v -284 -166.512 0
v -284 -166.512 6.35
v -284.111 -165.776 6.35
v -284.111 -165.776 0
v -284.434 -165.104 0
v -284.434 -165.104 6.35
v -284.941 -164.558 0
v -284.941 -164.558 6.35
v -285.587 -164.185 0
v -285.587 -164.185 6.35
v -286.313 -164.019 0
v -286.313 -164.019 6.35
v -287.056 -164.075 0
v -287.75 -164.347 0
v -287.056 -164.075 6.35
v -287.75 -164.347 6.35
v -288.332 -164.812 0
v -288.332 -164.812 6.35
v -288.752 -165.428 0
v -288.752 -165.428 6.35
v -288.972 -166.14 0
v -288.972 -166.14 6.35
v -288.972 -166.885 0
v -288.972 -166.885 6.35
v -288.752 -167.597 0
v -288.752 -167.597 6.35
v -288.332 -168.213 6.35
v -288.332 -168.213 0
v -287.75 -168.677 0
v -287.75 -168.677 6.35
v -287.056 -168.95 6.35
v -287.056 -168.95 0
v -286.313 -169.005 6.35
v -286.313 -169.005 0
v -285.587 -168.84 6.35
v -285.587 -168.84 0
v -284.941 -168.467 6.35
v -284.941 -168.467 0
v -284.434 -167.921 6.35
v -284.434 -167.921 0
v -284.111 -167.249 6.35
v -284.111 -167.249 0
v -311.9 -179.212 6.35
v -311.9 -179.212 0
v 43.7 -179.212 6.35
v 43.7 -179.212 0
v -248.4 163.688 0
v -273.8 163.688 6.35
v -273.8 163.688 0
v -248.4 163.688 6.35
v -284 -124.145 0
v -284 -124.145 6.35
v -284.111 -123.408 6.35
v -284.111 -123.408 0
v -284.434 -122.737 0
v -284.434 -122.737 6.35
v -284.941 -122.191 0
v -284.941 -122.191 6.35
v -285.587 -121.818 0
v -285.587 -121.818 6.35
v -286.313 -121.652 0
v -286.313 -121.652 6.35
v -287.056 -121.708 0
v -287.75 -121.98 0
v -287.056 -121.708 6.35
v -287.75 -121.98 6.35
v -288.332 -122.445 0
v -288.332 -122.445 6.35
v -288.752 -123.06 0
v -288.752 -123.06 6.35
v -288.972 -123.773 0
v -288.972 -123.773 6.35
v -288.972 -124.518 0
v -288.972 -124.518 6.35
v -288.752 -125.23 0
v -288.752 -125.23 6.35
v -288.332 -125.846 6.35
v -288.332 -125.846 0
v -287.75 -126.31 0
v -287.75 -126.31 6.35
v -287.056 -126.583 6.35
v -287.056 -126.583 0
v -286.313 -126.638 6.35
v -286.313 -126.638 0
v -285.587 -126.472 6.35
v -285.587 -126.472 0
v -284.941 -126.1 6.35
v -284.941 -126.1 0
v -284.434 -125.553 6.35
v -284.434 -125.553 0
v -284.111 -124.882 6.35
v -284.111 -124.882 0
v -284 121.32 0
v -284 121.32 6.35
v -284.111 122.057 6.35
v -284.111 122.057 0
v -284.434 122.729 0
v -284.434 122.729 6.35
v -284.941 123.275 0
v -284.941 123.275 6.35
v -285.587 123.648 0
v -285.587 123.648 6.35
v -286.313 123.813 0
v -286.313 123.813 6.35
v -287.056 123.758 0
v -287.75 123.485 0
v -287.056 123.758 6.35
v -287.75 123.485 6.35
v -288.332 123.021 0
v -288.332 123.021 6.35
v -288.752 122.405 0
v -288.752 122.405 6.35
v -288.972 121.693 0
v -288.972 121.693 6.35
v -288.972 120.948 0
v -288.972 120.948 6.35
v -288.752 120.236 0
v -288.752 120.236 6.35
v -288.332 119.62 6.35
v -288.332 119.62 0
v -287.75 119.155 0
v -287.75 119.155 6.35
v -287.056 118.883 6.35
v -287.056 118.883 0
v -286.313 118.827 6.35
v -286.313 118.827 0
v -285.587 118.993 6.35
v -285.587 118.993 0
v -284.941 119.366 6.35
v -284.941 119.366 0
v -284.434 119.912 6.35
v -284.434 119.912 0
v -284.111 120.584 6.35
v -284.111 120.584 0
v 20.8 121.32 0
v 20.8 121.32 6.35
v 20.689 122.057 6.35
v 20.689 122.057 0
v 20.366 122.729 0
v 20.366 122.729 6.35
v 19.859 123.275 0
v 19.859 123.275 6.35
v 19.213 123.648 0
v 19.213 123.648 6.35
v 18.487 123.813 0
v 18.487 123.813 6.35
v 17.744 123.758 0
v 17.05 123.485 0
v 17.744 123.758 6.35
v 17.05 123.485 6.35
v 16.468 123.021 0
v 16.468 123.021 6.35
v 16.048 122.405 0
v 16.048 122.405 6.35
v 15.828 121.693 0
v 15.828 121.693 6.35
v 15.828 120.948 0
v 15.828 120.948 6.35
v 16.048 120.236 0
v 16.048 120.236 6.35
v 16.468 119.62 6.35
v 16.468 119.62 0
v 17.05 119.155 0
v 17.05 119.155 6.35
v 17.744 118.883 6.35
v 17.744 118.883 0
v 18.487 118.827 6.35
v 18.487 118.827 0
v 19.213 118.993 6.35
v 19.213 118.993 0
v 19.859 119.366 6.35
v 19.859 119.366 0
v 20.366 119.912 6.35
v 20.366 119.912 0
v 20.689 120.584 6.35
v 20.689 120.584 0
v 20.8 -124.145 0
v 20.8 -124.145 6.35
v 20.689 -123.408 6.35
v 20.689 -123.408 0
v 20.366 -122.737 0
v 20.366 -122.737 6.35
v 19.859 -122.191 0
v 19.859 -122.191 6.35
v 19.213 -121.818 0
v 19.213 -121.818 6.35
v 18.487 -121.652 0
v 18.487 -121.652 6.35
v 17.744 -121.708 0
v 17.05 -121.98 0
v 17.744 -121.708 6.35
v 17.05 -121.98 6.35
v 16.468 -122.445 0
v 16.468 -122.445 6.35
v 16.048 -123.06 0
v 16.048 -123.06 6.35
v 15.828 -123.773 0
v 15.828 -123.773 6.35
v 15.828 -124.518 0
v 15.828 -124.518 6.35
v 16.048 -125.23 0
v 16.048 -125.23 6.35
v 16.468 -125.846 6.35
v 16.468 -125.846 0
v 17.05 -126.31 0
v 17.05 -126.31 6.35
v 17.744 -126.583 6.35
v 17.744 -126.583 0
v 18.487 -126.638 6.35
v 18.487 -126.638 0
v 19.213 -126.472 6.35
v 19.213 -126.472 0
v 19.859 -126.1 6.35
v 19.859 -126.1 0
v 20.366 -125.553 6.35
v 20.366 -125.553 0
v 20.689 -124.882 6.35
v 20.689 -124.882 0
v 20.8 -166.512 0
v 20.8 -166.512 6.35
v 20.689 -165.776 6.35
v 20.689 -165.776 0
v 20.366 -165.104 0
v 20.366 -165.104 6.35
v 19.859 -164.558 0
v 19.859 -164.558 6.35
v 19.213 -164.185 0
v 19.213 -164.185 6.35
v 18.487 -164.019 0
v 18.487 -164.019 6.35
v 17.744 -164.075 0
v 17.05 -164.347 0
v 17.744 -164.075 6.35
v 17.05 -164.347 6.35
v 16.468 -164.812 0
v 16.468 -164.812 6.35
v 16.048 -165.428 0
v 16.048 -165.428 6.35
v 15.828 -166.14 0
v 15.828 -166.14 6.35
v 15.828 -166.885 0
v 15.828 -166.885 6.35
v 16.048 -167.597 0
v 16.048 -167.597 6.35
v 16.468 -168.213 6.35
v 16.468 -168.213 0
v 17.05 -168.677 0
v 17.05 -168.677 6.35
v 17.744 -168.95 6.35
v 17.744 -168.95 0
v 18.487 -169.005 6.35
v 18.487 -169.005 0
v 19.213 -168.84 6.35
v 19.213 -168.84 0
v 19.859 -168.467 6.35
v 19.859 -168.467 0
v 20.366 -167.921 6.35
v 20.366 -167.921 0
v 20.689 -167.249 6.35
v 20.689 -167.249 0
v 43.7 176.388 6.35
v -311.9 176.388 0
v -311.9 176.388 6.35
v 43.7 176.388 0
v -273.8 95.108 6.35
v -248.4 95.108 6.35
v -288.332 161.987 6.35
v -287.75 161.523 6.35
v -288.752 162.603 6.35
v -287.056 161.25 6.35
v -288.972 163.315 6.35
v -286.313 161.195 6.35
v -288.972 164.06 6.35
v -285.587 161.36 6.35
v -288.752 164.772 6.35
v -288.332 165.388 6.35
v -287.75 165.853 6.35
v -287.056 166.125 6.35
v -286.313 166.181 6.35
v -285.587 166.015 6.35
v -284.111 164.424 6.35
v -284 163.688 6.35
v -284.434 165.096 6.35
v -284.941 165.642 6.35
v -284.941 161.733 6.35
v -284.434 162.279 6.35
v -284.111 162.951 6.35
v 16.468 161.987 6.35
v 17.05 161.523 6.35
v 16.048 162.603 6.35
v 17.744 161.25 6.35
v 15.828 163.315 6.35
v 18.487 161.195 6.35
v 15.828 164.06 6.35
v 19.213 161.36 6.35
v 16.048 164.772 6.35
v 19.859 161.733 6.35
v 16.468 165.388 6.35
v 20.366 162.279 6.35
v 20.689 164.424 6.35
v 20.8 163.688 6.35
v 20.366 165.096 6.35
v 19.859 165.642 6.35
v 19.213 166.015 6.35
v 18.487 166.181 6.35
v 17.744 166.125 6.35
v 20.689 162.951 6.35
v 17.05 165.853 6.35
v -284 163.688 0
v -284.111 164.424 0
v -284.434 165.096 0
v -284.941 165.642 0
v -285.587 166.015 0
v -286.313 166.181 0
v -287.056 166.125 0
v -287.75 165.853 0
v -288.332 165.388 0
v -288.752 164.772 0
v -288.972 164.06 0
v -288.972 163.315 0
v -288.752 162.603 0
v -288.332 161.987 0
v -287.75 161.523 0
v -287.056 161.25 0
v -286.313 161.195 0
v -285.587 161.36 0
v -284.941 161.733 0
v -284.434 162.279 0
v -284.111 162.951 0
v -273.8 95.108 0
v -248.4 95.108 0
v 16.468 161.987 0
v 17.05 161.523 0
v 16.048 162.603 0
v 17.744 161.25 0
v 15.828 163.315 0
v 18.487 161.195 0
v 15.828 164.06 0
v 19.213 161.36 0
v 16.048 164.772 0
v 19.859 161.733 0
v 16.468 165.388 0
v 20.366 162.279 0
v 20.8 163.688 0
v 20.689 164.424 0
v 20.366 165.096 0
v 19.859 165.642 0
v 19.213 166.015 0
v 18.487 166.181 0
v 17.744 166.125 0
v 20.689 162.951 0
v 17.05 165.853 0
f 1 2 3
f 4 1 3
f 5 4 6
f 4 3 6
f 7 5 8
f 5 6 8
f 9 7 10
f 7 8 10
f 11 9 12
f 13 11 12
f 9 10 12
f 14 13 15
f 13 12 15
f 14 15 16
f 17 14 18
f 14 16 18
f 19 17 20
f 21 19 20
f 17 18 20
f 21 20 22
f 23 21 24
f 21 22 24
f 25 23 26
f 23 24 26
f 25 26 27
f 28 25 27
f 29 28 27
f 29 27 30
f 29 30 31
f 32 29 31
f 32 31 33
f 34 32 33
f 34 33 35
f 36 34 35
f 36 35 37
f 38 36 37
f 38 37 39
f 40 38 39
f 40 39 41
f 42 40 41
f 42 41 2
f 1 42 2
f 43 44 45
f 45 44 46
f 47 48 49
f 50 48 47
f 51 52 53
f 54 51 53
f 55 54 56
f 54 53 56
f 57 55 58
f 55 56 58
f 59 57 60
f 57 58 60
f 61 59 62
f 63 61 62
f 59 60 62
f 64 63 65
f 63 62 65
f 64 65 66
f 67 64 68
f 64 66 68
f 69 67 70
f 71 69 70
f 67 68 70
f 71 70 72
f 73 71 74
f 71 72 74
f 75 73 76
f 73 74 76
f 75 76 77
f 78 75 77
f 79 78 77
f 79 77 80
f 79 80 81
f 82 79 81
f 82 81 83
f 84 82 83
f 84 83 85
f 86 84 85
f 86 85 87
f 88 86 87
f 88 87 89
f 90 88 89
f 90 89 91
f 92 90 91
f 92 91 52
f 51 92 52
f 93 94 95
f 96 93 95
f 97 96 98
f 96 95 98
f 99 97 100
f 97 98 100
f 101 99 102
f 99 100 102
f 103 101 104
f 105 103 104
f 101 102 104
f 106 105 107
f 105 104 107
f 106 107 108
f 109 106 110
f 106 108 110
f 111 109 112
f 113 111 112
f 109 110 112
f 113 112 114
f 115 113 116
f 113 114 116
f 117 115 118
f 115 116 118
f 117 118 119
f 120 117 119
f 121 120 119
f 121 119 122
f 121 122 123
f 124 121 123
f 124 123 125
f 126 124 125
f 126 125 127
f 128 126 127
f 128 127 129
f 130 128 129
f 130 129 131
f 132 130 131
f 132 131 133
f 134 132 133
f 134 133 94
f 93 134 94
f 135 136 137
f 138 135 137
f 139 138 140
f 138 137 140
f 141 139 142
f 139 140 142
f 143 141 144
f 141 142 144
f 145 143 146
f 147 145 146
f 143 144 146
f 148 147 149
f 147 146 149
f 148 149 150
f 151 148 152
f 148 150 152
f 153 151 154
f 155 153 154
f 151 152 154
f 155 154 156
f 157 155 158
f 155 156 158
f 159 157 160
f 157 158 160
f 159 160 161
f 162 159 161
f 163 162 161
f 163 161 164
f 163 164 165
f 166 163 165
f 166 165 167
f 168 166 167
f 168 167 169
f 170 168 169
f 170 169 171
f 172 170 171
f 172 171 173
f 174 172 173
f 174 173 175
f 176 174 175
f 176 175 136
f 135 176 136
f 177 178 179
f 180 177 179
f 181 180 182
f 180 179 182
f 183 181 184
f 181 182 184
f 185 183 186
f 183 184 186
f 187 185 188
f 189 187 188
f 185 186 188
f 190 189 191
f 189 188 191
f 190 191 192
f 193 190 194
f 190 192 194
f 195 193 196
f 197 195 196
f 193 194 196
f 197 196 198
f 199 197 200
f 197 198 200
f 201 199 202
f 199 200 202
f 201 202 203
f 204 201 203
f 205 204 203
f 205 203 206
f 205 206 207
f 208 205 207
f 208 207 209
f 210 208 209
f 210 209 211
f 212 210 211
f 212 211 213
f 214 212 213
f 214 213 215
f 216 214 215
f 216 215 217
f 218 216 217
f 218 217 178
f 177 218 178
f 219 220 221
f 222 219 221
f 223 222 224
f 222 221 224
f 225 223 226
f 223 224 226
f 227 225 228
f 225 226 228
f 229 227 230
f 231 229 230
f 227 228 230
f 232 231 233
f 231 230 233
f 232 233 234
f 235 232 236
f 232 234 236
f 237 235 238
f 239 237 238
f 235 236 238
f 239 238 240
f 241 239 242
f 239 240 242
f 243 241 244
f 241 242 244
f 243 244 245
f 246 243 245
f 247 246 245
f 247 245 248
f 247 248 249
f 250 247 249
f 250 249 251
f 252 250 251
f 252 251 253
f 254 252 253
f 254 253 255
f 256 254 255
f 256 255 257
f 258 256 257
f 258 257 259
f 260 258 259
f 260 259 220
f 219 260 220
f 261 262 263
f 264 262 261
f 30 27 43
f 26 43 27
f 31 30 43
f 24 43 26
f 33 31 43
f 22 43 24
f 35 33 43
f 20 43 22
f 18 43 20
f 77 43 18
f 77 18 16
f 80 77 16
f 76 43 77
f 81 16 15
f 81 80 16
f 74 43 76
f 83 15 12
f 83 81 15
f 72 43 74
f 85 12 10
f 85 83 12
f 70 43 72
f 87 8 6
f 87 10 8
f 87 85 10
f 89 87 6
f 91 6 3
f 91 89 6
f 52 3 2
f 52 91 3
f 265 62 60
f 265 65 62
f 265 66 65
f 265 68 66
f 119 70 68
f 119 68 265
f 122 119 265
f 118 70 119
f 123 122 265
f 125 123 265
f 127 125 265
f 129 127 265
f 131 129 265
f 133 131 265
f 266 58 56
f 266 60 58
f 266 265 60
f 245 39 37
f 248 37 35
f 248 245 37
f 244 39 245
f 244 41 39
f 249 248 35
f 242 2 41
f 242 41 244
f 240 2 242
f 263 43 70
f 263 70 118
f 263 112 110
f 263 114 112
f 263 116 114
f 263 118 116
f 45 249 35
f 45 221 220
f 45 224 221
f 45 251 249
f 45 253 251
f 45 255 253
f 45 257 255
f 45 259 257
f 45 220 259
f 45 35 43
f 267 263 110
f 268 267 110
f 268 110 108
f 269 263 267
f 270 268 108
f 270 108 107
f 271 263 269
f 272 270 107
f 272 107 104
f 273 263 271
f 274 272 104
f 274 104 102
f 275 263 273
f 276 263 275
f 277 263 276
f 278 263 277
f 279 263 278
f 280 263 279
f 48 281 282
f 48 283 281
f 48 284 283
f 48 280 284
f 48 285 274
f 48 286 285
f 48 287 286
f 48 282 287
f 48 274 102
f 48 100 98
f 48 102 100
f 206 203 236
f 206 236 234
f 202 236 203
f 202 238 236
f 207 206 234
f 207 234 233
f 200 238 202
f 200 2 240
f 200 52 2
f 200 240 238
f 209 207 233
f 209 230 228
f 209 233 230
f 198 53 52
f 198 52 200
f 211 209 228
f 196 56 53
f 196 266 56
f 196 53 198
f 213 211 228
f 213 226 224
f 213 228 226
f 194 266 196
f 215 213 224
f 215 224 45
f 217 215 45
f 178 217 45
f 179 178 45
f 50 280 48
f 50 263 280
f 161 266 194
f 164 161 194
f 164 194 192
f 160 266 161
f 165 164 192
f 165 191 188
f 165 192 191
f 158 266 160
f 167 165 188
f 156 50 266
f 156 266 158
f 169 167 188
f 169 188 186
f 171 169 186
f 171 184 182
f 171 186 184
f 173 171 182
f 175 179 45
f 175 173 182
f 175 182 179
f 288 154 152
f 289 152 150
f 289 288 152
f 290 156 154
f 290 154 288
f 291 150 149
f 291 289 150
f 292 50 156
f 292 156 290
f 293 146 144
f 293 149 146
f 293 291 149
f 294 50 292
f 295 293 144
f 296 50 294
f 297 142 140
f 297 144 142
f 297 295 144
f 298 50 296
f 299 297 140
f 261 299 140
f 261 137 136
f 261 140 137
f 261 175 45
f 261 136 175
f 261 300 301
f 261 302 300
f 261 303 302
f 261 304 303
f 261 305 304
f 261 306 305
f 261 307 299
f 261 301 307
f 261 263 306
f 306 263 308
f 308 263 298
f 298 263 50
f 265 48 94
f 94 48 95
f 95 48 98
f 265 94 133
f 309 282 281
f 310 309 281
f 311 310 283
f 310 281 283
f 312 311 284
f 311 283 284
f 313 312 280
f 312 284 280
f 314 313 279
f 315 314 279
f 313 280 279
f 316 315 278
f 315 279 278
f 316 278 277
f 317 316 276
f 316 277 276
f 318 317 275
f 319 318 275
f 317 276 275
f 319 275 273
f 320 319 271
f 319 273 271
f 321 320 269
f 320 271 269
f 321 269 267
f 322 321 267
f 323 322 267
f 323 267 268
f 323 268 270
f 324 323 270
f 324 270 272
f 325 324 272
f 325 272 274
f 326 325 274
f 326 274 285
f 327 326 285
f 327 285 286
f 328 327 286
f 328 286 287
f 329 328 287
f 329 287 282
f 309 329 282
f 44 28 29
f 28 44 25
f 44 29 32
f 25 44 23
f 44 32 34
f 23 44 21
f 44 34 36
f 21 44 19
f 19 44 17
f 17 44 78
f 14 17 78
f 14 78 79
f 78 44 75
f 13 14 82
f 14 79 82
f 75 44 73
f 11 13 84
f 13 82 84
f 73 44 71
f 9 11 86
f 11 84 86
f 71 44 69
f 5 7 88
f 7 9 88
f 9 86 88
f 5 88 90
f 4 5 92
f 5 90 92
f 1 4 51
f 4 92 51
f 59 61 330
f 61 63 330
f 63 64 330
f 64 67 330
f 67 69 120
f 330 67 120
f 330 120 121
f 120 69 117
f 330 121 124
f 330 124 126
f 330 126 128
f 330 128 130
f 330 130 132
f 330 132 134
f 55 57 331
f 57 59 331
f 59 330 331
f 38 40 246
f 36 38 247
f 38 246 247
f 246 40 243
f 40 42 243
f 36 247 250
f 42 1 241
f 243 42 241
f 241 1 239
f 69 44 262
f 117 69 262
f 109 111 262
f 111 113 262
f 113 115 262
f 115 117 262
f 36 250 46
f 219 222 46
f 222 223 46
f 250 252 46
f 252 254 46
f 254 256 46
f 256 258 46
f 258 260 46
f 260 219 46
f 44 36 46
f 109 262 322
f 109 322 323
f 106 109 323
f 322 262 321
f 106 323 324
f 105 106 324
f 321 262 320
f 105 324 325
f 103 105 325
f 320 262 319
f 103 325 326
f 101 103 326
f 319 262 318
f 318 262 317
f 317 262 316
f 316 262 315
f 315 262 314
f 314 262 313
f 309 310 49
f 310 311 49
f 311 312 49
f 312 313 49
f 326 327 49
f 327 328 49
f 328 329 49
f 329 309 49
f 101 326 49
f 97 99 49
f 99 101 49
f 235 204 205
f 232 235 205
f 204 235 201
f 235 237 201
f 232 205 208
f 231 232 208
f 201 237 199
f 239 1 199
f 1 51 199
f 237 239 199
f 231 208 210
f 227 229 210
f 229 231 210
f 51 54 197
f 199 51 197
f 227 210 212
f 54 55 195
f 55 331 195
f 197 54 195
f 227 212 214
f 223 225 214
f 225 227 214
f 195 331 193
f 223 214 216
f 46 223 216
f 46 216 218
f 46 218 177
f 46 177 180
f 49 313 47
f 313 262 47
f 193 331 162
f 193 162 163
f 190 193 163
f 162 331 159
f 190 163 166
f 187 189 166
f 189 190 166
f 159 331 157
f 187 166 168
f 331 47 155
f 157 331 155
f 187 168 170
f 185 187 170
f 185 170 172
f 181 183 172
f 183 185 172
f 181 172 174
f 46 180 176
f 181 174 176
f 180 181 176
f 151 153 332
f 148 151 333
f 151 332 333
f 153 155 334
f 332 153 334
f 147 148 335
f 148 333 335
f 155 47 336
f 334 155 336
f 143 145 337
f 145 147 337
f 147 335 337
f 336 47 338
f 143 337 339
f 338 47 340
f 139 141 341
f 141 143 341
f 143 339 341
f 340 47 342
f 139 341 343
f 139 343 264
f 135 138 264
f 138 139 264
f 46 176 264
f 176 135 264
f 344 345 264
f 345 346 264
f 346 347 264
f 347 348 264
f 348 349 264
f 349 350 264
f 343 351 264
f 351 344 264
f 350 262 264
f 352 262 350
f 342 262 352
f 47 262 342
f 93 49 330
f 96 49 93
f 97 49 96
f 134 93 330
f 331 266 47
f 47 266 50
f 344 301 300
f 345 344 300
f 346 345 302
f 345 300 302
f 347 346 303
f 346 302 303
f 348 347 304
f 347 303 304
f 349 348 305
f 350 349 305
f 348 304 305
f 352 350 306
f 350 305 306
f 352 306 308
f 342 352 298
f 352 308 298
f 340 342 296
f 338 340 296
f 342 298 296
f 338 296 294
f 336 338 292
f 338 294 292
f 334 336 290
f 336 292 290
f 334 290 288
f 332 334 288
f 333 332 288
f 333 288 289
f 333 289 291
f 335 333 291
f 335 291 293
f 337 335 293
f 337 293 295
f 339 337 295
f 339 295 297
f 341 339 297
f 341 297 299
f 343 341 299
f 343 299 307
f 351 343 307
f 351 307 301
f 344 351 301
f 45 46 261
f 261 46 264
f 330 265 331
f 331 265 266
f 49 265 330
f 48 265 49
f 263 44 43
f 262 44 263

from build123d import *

# Parameters (mm, degrees)
F0_W     = 355.6
F0_H     = 355.6
F1_DEPTH = 6.35
F2_R     = 2.5
F2_W     = 25.4
F2_H     = 68.58
F3_DEPTH = 6.351
F4_DEPTH = 6.351
F5_DEPTH = 6.351


with BuildPart() as f1:
    # F0 (on Top) → F1 (new body)
    with BuildSketch(Plane.XY):
        with Locations((-134.099856, -1.412397)):
            Rectangle(F0_W, F0_H)
    extrude(amount=F1_DEPTH)

    # F2 (on face) → F3 (cut, through all)
    with BuildSketch(Plane.XY.offset(6.35)):
        with Locations((-286.499856, 163.687603)):
            Circle(F2_R)
        with Locations((-286.499856, -166.512397)):
            Circle(F2_R)
        with Locations((18.300144, -166.512397)):
            Circle(F2_R)
        with Locations((18.300144, 163.687603)):
            Circle(F2_R)
        with Locations((-286.499856, -124.145197)):
            Circle(F2_R)
        with Locations((-286.499856, 121.320403)):
            Circle(F2_R)
        with Locations((18.300144, 121.320403)):
            Circle(F2_R)
        with Locations((18.300144, -124.145197)):
            Circle(F2_R)
        with Locations((-261.099856, 129.397603)):
            Rectangle(F2_W, F2_H)
    extrude(amount=-F3_DEPTH, mode=Mode.SUBTRACT)

    # F2 (on face) → F4 (cut, through all)
    with BuildSketch(Plane.XY.offset(6.35)):
        with Locations((-286.499856, 163.687603)):
            Circle(F2_R)
        with Locations((-286.499856, -166.512397)):
            Circle(F2_R)
        with Locations((18.300144, -166.512397)):
            Circle(F2_R)
        with Locations((18.300144, 163.687603)):
            Circle(F2_R)
        with Locations((-286.499856, -124.145197)):
            Circle(F2_R)
        with Locations((-286.499856, 121.320403)):
            Circle(F2_R)
        with Locations((18.300144, 121.320403)):
            Circle(F2_R)
        with Locations((18.300144, -124.145197)):
            Circle(F2_R)
        with Locations((-261.099856, 129.397603)):
            Rectangle(F2_W, F2_H)
    extrude(amount=-F4_DEPTH, mode=Mode.SUBTRACT)

    # F2 (on face) → F5 (cut, through all)
    with BuildSketch(Plane.XY.offset(6.35)):
        with Locations((-286.499856, 163.687603)):
            Circle(F2_R)
        with Locations((-286.499856, -166.512397)):
            Circle(F2_R)
        with Locations((18.300144, -166.512397)):
            Circle(F2_R)
        with Locations((18.300144, 163.687603)):
            Circle(F2_R)
        with Locations((-286.499856, -124.145197)):
            Circle(F2_R)
        with Locations((-286.499856, 121.320403)):
            Circle(F2_R)
        with Locations((18.300144, 121.320403)):
            Circle(F2_R)
        with Locations((18.300144, -124.145197)):
            Circle(F2_R)
    extrude(amount=-F5_DEPTH, mode=Mode.SUBTRACT)


solid = f1.part
